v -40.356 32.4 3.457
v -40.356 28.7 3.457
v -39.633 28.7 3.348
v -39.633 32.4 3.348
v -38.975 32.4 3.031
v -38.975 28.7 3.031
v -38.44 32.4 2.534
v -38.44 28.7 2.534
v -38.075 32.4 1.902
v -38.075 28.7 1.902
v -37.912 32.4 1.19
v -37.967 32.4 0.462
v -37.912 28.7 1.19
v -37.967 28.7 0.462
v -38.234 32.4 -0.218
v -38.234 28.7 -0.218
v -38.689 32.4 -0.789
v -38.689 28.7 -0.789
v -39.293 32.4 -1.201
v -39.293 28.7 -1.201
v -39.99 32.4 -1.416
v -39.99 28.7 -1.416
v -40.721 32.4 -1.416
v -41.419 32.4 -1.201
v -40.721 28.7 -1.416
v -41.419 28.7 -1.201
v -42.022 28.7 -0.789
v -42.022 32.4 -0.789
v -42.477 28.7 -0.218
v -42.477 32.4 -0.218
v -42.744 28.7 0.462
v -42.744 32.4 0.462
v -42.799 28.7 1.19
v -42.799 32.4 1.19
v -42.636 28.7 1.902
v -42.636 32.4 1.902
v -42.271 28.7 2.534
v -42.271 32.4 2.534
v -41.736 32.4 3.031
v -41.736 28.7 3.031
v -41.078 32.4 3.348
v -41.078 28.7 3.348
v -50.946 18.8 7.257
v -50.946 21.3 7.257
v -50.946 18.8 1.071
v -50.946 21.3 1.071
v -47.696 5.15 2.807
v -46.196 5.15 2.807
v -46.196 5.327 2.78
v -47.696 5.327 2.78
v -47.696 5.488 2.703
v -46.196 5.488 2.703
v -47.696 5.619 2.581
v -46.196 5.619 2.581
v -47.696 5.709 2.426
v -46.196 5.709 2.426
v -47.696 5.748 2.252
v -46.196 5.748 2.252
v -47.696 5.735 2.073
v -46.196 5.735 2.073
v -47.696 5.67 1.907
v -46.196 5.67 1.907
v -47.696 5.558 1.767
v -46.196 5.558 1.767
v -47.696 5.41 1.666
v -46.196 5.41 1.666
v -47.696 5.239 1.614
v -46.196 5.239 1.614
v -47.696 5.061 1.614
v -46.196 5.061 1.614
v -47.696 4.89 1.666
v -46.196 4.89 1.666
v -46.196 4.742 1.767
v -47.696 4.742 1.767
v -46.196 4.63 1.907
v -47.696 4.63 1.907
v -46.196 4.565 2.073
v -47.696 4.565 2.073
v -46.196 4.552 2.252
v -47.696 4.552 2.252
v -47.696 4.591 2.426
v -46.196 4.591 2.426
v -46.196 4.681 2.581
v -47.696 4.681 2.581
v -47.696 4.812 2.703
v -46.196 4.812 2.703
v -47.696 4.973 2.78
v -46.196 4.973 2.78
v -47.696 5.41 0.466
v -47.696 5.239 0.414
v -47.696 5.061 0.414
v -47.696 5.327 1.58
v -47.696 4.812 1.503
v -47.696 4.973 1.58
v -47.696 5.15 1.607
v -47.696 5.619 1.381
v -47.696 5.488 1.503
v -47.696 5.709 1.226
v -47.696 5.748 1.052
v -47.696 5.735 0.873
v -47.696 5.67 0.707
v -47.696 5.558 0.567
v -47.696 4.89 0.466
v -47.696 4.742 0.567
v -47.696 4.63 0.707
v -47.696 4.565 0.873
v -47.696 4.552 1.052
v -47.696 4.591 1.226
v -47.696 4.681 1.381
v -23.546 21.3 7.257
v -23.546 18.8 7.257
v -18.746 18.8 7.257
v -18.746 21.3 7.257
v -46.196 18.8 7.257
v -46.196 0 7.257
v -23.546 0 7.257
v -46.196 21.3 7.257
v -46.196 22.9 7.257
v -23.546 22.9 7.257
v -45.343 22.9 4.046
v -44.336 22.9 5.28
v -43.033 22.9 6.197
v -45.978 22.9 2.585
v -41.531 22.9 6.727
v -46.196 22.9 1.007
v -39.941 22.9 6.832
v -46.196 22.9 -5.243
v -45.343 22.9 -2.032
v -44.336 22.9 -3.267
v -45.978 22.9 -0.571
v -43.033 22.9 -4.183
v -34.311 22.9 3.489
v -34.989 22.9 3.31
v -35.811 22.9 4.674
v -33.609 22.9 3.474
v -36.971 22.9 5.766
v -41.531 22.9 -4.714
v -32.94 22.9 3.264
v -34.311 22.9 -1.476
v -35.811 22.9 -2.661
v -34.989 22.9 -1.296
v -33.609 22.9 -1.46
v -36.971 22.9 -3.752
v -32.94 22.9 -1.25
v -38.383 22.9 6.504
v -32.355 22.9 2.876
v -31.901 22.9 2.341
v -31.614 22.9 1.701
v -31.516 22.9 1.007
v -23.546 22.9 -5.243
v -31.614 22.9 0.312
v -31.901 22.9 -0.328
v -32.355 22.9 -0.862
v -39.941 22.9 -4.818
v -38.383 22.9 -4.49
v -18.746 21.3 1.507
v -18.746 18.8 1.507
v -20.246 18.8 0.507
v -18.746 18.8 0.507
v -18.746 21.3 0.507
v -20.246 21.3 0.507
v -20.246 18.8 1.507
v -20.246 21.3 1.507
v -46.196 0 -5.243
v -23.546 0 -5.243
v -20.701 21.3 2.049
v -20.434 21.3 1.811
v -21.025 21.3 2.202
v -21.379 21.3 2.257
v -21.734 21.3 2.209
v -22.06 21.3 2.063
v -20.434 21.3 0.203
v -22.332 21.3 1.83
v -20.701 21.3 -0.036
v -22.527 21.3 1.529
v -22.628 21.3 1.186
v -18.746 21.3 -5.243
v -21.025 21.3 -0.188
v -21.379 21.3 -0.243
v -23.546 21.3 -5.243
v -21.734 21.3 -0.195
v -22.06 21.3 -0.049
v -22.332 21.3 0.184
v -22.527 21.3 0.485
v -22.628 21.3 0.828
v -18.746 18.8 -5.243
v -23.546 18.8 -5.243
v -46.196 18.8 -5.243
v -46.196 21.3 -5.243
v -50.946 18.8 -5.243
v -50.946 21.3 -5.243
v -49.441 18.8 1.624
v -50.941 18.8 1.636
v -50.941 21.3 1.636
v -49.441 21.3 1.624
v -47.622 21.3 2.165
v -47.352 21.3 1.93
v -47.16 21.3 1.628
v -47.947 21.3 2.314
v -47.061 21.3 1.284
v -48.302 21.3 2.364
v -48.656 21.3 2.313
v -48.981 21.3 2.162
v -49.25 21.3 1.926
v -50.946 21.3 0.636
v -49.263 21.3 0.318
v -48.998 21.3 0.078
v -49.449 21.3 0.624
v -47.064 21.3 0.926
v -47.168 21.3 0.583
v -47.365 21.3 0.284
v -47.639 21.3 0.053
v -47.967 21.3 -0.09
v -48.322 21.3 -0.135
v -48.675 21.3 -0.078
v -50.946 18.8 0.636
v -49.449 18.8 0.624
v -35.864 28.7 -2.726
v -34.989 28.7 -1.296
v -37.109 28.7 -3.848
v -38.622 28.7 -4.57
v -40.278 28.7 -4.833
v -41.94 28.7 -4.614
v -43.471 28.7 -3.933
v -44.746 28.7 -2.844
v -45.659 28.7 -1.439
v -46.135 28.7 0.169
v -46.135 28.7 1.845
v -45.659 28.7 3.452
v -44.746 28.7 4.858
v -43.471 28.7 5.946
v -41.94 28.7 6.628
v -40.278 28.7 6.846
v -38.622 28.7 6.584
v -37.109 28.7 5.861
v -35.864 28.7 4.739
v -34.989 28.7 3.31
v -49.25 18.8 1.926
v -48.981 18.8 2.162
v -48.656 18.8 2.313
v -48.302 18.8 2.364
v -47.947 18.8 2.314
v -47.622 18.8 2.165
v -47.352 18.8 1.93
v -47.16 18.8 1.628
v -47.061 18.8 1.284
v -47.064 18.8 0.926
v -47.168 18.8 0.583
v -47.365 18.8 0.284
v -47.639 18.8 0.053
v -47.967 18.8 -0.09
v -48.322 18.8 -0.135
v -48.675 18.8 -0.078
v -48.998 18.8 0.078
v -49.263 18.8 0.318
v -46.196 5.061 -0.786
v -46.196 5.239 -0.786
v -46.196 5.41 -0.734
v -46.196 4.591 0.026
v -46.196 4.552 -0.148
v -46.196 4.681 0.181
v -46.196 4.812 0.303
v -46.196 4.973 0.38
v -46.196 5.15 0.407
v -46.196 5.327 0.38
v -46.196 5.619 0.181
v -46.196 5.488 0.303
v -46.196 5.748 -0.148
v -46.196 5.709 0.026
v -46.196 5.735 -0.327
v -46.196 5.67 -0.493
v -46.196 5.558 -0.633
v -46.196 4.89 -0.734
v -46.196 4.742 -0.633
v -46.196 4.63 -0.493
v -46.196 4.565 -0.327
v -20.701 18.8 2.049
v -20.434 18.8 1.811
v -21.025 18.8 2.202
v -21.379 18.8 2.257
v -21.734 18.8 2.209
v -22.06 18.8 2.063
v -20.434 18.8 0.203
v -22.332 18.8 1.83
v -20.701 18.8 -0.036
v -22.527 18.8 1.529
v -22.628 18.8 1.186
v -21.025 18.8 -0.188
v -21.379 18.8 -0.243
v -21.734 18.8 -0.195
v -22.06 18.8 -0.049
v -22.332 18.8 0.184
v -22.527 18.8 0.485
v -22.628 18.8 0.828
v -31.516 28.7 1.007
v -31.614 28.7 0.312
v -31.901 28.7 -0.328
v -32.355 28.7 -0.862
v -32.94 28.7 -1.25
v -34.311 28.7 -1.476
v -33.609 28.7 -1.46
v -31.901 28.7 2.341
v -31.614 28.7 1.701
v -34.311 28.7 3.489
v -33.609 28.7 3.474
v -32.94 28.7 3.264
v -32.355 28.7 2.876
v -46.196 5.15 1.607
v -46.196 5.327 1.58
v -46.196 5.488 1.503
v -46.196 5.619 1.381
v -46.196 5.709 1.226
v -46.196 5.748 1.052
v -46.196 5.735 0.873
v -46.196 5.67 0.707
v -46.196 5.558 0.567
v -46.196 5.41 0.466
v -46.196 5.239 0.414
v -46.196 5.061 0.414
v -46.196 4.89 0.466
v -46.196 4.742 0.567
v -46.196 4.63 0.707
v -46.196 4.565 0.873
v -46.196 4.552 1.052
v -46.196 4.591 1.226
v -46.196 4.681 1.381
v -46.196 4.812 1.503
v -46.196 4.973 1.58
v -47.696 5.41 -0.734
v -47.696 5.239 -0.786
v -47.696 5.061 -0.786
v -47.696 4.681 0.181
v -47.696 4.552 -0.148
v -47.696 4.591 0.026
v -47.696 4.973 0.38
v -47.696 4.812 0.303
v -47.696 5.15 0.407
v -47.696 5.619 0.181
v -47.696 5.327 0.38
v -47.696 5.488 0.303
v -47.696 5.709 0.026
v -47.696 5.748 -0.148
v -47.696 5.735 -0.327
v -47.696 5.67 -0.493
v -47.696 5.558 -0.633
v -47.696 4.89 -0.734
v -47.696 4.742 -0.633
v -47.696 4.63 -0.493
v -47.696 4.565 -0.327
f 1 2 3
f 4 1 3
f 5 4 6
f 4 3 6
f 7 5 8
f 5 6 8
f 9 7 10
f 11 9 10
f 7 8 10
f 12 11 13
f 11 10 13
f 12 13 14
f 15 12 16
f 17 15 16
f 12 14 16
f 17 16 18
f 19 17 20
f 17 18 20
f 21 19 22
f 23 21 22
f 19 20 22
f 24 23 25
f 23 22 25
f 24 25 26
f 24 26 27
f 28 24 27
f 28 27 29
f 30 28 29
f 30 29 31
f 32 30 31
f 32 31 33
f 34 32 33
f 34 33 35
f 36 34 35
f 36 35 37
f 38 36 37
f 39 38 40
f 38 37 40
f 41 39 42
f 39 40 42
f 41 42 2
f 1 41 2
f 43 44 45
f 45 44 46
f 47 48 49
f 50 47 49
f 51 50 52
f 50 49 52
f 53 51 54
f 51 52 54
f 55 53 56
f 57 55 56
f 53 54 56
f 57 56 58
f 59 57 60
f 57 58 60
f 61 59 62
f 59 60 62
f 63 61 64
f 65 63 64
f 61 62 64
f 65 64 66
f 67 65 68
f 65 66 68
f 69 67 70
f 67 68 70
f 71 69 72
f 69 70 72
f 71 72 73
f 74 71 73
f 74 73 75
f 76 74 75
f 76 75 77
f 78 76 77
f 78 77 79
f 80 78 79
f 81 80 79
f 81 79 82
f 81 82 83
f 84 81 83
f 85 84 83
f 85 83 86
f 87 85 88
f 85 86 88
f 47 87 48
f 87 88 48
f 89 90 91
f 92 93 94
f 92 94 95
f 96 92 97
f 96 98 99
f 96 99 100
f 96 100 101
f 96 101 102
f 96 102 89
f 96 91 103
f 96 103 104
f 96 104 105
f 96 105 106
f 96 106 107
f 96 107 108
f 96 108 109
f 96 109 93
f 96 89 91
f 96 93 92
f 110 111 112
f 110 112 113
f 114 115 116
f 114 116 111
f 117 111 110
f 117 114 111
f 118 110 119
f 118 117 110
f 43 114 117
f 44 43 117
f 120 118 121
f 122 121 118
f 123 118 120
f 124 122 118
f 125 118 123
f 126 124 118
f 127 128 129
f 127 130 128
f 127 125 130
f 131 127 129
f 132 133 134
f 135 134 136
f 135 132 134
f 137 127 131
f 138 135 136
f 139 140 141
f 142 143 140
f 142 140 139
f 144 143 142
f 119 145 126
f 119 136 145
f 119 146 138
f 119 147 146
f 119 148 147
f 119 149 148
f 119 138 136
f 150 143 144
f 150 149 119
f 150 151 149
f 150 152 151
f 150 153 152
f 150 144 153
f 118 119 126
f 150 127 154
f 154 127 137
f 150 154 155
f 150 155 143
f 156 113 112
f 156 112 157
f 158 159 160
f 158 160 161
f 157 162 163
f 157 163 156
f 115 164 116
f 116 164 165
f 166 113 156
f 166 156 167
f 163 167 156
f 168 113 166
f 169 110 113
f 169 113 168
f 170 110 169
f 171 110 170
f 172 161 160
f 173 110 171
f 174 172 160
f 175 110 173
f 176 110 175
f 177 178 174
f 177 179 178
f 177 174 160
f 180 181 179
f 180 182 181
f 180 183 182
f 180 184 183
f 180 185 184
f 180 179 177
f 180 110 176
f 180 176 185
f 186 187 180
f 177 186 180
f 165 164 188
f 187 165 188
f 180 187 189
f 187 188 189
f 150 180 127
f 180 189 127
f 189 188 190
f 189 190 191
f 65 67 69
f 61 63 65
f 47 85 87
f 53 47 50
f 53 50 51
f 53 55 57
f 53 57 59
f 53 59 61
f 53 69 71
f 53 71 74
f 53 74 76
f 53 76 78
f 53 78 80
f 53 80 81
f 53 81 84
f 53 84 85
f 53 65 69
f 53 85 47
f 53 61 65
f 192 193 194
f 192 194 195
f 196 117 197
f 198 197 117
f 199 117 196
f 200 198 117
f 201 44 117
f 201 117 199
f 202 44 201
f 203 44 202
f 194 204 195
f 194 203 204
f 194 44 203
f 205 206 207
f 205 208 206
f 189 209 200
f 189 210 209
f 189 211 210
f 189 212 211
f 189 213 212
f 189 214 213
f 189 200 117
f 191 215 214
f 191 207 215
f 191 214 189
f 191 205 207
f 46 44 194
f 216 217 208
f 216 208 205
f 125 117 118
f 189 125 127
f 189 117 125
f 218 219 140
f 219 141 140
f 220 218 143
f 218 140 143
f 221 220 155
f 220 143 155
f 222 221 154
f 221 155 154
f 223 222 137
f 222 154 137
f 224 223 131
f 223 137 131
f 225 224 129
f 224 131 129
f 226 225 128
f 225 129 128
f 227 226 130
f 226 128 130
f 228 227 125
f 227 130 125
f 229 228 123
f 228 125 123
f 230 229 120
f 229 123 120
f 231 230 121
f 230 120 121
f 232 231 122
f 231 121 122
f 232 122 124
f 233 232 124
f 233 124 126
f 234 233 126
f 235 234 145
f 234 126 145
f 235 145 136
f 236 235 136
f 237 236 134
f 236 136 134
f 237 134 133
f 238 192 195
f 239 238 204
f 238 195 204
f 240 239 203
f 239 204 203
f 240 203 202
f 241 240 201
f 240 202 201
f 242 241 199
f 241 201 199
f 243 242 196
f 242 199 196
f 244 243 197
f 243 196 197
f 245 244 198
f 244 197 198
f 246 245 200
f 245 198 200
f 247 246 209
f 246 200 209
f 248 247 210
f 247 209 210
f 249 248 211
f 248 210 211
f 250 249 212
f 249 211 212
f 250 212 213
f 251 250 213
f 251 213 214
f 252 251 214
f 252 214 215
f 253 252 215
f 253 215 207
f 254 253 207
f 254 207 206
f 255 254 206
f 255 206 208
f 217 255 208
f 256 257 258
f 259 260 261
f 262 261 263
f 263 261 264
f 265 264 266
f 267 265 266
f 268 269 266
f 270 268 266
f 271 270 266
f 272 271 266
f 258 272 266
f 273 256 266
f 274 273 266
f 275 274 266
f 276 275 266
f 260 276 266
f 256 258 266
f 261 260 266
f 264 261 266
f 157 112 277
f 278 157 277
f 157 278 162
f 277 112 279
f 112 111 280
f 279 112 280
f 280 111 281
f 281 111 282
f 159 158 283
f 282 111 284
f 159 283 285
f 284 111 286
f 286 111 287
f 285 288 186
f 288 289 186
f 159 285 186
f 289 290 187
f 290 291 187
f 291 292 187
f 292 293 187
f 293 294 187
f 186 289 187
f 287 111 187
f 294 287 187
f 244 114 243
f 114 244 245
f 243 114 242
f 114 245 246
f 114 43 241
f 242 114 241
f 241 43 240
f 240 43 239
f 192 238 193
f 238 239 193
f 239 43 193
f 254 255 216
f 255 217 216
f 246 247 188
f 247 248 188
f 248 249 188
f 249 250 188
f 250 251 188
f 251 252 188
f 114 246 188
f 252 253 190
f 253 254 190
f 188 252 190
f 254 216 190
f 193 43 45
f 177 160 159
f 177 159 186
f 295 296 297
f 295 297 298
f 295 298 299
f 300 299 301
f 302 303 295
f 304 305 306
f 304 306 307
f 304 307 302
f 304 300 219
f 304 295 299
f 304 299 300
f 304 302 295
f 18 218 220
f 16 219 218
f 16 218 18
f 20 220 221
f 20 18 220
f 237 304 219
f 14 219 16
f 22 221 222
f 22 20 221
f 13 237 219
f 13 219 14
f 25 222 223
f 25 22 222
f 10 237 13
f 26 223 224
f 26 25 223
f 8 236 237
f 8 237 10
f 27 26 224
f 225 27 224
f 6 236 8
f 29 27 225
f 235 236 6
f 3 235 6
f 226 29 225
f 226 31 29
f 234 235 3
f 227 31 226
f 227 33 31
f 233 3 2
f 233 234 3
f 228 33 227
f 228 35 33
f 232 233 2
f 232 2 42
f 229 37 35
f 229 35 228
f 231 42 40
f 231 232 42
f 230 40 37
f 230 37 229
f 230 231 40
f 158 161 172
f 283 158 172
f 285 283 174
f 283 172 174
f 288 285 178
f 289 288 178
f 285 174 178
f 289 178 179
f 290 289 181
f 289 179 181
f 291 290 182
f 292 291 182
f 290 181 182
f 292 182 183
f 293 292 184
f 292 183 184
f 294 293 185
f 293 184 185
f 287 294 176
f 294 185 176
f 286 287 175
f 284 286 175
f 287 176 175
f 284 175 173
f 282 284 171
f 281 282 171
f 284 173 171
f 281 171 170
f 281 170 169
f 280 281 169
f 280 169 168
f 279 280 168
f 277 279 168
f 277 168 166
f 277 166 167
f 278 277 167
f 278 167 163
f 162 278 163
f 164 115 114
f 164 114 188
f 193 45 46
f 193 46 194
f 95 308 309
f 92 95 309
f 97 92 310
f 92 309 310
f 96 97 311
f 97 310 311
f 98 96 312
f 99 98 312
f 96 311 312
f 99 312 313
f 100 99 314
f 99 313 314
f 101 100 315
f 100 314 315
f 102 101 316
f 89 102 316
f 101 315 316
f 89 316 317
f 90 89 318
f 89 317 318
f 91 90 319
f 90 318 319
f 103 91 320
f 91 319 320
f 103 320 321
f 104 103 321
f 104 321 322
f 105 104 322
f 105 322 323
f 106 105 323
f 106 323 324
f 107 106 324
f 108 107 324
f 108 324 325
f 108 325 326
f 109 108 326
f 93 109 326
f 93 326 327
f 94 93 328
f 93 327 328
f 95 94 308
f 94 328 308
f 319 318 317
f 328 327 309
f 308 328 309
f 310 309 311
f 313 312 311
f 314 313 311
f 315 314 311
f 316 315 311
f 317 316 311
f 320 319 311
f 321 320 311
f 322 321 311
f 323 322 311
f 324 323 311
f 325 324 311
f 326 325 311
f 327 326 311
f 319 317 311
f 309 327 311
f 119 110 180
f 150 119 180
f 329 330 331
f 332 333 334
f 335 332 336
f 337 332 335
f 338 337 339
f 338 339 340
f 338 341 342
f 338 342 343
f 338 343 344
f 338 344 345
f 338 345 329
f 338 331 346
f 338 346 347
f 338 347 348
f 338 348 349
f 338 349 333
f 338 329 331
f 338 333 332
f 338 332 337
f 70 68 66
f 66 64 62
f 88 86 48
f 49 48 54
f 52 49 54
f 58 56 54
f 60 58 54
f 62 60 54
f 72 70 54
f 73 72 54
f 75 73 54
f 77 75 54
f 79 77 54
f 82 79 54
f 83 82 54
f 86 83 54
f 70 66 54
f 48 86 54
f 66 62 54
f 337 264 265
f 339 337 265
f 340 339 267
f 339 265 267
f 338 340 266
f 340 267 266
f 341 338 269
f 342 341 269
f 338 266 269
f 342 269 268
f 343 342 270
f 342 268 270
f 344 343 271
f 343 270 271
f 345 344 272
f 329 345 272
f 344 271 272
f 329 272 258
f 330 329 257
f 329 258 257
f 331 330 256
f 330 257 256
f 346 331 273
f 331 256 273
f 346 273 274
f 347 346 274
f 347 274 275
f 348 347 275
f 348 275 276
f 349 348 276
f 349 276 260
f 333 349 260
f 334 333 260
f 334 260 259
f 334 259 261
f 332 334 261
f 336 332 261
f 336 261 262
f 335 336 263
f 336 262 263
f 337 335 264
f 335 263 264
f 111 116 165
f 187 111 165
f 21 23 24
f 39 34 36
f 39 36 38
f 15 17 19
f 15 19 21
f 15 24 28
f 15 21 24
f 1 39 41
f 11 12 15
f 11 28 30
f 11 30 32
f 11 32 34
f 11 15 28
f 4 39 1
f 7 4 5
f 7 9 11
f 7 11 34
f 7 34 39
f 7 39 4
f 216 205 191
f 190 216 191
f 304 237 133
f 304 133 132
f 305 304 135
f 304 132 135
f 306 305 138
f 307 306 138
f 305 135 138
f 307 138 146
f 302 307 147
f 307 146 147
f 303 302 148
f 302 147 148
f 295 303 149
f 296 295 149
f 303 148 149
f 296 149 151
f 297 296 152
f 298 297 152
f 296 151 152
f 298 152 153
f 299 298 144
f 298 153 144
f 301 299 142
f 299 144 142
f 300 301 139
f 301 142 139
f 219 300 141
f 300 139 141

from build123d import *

# Parameters (mm, degrees)
SKETCH1_W                = 22.65
SKETCH1_H                = 12.5
BOSS_EXTRUDE1_DEPTH      = 22.9
SKETCH4_R                = 5.84
BOSS_EXTRUDE6_DEPTH      = 5.8
SKETCH12_R               = 2.45
BOSS_EXTRUDE7_DEPTH      = 3.7
SKETCH13_R               = 2.5
BOSS_EXTRUDE8_DEPTH      = 5.8
BOSS_EXTRUDE9_DEPTH      = 4.8
BOSS_EXTRUDE9_DEPTH_BACK = 27.4
SKETCH16_W               = 12.5
SKETCH16_H               = 2.5
CUT_EXTRUDE2_DEPTH       = 4.1
SKETCH18_R               = 0.6
BOSS_EXTRUDE14_DEPTH     = 1.5
BOSS_EXTRUDE14_2_DEPTH   = 1.5
BOSS_EXTRUDE14_3_DEPTH   = 1.5


with BuildPart() as part:
    # Sketch1 → Boss-Extrude1 (new body)
    with BuildSketch(Plane(origin=(0, 0, 0), x_dir=(1, 0, 0), z_dir=(0, 1, 0))):
        with Locations((-34.870532414, -1.006861806)):
            Rectangle(SKETCH1_W, SKETCH1_H)
    extrude(amount=BOSS_EXTRUDE1_DEPTH)

    # Sketch4 → Boss-Extrude6 (add)
    with BuildSketch(Plane(origin=(0, 22.9, 0), x_dir=(-1, 0, 0), z_dir=(0, 1, 0))):
        with Locations((40.355532414, 1.006861806)):
            Circle(SKETCH4_R)
    extrude(amount=BOSS_EXTRUDE6_DEPTH)

    # Sketch12 → Boss-Extrude7 (add)
    with BuildSketch(Plane(origin=(0, 28.7, 0), x_dir=(-1, 0, 0), z_dir=(0, 1, 0))):
        with Locations(Location((40.355532414, 1.006861806, 0), (0, 0, 90))):
            Circle(SKETCH12_R)
    extrude(amount=BOSS_EXTRUDE7_DEPTH)

    # Sketch13 → Boss-Extrude8 (add)
    with BuildSketch(Plane(origin=(0, 22.9, 0), x_dir=(-1, 0, 0), z_dir=(0, 1, 0))):
        with Locations((34.015532414, 1.006861806)):
            Circle(SKETCH13_R)
    extrude(amount=BOSS_EXTRUDE8_DEPTH)

    # Sketch16 → Boss-Extrude9 (add, two sides: drawn at the far end of the back side and taken through both)
    with BuildSketch(Plane(origin=(-23.545532414, 0, 0), x_dir=(0, 0, -1), z_dir=(1, 0, 0)).offset(-BOSS_EXTRUDE9_DEPTH_BACK)):
        with Locations((-1.006861806, 20.05)):
            Rectangle(SKETCH16_W, SKETCH16_H)
    extrude(amount=BOSS_EXTRUDE9_DEPTH + BOSS_EXTRUDE9_DEPTH_BACK)

    # Sketch17 → Cut-Extrude2 (cut)
    with BuildSketch(Plane(origin=(-23.545532414, 22.9, -5.243138194), x_dir=(1, 0, 0), z_dir=(0, -1, 0))):
        with BuildLine():
            Line((4.8, 5.75), (3.3, 5.75))
            ThreePointArc((3.3, 5.75), (0.904356076, 6.25), (3.3, 6.75))
            Line((3.3, 6.75), (4.8, 6.75))
            Line((4.8, 6.75), (4.8, 5.75))
        make_face()
        with BuildLine():
            Line((-27.395484872, 6.878781939), (-25.895532871, 6.866782131))
            ThreePointArc((-25.895532871, 6.866782131), (-23.503965543, 6.347633286), (-25.903532743, 5.866814131))
            Line((-25.903532743, 5.866814131), (-27.403484744, 5.878813939))
            Line((-27.403484744, 5.878813939), (-27.395484872, 6.878781939))
        make_face()
    extrude(amount=CUT_EXTRUDE2_DEPTH, mode=Mode.SUBTRACT)


with BuildPart() as body_2:
    # Sketch18 → Boss-Extrude14 (new body)
    with BuildSketch(Plane.ZY.offset(46.195532414)):
        with Locations((-0.193138194, 5.15)):
            Circle(SKETCH18_R)
    extrude(amount=BOSS_EXTRUDE14_DEPTH)


with BuildPart() as body_3:
    # Sketch18 → Boss-Extrude14 2 (new body)
    with BuildSketch(Plane.ZY.offset(46.195532414)):
        with Locations((1.006861806, 5.15)):
            Circle(SKETCH18_R)
    extrude(amount=BOSS_EXTRUDE14_2_DEPTH)


with BuildPart() as body_4:
    # Sketch18 → Boss-Extrude14 3 (new body)
    with BuildSketch(Plane.ZY.offset(46.195532414)):
        with Locations((2.206861806, 5.15)):
            Circle(SKETCH18_R)
    extrude(amount=BOSS_EXTRUDE14_3_DEPTH)


solid = Compound([part.part, body_2.part, body_3.part, body_4.part])
